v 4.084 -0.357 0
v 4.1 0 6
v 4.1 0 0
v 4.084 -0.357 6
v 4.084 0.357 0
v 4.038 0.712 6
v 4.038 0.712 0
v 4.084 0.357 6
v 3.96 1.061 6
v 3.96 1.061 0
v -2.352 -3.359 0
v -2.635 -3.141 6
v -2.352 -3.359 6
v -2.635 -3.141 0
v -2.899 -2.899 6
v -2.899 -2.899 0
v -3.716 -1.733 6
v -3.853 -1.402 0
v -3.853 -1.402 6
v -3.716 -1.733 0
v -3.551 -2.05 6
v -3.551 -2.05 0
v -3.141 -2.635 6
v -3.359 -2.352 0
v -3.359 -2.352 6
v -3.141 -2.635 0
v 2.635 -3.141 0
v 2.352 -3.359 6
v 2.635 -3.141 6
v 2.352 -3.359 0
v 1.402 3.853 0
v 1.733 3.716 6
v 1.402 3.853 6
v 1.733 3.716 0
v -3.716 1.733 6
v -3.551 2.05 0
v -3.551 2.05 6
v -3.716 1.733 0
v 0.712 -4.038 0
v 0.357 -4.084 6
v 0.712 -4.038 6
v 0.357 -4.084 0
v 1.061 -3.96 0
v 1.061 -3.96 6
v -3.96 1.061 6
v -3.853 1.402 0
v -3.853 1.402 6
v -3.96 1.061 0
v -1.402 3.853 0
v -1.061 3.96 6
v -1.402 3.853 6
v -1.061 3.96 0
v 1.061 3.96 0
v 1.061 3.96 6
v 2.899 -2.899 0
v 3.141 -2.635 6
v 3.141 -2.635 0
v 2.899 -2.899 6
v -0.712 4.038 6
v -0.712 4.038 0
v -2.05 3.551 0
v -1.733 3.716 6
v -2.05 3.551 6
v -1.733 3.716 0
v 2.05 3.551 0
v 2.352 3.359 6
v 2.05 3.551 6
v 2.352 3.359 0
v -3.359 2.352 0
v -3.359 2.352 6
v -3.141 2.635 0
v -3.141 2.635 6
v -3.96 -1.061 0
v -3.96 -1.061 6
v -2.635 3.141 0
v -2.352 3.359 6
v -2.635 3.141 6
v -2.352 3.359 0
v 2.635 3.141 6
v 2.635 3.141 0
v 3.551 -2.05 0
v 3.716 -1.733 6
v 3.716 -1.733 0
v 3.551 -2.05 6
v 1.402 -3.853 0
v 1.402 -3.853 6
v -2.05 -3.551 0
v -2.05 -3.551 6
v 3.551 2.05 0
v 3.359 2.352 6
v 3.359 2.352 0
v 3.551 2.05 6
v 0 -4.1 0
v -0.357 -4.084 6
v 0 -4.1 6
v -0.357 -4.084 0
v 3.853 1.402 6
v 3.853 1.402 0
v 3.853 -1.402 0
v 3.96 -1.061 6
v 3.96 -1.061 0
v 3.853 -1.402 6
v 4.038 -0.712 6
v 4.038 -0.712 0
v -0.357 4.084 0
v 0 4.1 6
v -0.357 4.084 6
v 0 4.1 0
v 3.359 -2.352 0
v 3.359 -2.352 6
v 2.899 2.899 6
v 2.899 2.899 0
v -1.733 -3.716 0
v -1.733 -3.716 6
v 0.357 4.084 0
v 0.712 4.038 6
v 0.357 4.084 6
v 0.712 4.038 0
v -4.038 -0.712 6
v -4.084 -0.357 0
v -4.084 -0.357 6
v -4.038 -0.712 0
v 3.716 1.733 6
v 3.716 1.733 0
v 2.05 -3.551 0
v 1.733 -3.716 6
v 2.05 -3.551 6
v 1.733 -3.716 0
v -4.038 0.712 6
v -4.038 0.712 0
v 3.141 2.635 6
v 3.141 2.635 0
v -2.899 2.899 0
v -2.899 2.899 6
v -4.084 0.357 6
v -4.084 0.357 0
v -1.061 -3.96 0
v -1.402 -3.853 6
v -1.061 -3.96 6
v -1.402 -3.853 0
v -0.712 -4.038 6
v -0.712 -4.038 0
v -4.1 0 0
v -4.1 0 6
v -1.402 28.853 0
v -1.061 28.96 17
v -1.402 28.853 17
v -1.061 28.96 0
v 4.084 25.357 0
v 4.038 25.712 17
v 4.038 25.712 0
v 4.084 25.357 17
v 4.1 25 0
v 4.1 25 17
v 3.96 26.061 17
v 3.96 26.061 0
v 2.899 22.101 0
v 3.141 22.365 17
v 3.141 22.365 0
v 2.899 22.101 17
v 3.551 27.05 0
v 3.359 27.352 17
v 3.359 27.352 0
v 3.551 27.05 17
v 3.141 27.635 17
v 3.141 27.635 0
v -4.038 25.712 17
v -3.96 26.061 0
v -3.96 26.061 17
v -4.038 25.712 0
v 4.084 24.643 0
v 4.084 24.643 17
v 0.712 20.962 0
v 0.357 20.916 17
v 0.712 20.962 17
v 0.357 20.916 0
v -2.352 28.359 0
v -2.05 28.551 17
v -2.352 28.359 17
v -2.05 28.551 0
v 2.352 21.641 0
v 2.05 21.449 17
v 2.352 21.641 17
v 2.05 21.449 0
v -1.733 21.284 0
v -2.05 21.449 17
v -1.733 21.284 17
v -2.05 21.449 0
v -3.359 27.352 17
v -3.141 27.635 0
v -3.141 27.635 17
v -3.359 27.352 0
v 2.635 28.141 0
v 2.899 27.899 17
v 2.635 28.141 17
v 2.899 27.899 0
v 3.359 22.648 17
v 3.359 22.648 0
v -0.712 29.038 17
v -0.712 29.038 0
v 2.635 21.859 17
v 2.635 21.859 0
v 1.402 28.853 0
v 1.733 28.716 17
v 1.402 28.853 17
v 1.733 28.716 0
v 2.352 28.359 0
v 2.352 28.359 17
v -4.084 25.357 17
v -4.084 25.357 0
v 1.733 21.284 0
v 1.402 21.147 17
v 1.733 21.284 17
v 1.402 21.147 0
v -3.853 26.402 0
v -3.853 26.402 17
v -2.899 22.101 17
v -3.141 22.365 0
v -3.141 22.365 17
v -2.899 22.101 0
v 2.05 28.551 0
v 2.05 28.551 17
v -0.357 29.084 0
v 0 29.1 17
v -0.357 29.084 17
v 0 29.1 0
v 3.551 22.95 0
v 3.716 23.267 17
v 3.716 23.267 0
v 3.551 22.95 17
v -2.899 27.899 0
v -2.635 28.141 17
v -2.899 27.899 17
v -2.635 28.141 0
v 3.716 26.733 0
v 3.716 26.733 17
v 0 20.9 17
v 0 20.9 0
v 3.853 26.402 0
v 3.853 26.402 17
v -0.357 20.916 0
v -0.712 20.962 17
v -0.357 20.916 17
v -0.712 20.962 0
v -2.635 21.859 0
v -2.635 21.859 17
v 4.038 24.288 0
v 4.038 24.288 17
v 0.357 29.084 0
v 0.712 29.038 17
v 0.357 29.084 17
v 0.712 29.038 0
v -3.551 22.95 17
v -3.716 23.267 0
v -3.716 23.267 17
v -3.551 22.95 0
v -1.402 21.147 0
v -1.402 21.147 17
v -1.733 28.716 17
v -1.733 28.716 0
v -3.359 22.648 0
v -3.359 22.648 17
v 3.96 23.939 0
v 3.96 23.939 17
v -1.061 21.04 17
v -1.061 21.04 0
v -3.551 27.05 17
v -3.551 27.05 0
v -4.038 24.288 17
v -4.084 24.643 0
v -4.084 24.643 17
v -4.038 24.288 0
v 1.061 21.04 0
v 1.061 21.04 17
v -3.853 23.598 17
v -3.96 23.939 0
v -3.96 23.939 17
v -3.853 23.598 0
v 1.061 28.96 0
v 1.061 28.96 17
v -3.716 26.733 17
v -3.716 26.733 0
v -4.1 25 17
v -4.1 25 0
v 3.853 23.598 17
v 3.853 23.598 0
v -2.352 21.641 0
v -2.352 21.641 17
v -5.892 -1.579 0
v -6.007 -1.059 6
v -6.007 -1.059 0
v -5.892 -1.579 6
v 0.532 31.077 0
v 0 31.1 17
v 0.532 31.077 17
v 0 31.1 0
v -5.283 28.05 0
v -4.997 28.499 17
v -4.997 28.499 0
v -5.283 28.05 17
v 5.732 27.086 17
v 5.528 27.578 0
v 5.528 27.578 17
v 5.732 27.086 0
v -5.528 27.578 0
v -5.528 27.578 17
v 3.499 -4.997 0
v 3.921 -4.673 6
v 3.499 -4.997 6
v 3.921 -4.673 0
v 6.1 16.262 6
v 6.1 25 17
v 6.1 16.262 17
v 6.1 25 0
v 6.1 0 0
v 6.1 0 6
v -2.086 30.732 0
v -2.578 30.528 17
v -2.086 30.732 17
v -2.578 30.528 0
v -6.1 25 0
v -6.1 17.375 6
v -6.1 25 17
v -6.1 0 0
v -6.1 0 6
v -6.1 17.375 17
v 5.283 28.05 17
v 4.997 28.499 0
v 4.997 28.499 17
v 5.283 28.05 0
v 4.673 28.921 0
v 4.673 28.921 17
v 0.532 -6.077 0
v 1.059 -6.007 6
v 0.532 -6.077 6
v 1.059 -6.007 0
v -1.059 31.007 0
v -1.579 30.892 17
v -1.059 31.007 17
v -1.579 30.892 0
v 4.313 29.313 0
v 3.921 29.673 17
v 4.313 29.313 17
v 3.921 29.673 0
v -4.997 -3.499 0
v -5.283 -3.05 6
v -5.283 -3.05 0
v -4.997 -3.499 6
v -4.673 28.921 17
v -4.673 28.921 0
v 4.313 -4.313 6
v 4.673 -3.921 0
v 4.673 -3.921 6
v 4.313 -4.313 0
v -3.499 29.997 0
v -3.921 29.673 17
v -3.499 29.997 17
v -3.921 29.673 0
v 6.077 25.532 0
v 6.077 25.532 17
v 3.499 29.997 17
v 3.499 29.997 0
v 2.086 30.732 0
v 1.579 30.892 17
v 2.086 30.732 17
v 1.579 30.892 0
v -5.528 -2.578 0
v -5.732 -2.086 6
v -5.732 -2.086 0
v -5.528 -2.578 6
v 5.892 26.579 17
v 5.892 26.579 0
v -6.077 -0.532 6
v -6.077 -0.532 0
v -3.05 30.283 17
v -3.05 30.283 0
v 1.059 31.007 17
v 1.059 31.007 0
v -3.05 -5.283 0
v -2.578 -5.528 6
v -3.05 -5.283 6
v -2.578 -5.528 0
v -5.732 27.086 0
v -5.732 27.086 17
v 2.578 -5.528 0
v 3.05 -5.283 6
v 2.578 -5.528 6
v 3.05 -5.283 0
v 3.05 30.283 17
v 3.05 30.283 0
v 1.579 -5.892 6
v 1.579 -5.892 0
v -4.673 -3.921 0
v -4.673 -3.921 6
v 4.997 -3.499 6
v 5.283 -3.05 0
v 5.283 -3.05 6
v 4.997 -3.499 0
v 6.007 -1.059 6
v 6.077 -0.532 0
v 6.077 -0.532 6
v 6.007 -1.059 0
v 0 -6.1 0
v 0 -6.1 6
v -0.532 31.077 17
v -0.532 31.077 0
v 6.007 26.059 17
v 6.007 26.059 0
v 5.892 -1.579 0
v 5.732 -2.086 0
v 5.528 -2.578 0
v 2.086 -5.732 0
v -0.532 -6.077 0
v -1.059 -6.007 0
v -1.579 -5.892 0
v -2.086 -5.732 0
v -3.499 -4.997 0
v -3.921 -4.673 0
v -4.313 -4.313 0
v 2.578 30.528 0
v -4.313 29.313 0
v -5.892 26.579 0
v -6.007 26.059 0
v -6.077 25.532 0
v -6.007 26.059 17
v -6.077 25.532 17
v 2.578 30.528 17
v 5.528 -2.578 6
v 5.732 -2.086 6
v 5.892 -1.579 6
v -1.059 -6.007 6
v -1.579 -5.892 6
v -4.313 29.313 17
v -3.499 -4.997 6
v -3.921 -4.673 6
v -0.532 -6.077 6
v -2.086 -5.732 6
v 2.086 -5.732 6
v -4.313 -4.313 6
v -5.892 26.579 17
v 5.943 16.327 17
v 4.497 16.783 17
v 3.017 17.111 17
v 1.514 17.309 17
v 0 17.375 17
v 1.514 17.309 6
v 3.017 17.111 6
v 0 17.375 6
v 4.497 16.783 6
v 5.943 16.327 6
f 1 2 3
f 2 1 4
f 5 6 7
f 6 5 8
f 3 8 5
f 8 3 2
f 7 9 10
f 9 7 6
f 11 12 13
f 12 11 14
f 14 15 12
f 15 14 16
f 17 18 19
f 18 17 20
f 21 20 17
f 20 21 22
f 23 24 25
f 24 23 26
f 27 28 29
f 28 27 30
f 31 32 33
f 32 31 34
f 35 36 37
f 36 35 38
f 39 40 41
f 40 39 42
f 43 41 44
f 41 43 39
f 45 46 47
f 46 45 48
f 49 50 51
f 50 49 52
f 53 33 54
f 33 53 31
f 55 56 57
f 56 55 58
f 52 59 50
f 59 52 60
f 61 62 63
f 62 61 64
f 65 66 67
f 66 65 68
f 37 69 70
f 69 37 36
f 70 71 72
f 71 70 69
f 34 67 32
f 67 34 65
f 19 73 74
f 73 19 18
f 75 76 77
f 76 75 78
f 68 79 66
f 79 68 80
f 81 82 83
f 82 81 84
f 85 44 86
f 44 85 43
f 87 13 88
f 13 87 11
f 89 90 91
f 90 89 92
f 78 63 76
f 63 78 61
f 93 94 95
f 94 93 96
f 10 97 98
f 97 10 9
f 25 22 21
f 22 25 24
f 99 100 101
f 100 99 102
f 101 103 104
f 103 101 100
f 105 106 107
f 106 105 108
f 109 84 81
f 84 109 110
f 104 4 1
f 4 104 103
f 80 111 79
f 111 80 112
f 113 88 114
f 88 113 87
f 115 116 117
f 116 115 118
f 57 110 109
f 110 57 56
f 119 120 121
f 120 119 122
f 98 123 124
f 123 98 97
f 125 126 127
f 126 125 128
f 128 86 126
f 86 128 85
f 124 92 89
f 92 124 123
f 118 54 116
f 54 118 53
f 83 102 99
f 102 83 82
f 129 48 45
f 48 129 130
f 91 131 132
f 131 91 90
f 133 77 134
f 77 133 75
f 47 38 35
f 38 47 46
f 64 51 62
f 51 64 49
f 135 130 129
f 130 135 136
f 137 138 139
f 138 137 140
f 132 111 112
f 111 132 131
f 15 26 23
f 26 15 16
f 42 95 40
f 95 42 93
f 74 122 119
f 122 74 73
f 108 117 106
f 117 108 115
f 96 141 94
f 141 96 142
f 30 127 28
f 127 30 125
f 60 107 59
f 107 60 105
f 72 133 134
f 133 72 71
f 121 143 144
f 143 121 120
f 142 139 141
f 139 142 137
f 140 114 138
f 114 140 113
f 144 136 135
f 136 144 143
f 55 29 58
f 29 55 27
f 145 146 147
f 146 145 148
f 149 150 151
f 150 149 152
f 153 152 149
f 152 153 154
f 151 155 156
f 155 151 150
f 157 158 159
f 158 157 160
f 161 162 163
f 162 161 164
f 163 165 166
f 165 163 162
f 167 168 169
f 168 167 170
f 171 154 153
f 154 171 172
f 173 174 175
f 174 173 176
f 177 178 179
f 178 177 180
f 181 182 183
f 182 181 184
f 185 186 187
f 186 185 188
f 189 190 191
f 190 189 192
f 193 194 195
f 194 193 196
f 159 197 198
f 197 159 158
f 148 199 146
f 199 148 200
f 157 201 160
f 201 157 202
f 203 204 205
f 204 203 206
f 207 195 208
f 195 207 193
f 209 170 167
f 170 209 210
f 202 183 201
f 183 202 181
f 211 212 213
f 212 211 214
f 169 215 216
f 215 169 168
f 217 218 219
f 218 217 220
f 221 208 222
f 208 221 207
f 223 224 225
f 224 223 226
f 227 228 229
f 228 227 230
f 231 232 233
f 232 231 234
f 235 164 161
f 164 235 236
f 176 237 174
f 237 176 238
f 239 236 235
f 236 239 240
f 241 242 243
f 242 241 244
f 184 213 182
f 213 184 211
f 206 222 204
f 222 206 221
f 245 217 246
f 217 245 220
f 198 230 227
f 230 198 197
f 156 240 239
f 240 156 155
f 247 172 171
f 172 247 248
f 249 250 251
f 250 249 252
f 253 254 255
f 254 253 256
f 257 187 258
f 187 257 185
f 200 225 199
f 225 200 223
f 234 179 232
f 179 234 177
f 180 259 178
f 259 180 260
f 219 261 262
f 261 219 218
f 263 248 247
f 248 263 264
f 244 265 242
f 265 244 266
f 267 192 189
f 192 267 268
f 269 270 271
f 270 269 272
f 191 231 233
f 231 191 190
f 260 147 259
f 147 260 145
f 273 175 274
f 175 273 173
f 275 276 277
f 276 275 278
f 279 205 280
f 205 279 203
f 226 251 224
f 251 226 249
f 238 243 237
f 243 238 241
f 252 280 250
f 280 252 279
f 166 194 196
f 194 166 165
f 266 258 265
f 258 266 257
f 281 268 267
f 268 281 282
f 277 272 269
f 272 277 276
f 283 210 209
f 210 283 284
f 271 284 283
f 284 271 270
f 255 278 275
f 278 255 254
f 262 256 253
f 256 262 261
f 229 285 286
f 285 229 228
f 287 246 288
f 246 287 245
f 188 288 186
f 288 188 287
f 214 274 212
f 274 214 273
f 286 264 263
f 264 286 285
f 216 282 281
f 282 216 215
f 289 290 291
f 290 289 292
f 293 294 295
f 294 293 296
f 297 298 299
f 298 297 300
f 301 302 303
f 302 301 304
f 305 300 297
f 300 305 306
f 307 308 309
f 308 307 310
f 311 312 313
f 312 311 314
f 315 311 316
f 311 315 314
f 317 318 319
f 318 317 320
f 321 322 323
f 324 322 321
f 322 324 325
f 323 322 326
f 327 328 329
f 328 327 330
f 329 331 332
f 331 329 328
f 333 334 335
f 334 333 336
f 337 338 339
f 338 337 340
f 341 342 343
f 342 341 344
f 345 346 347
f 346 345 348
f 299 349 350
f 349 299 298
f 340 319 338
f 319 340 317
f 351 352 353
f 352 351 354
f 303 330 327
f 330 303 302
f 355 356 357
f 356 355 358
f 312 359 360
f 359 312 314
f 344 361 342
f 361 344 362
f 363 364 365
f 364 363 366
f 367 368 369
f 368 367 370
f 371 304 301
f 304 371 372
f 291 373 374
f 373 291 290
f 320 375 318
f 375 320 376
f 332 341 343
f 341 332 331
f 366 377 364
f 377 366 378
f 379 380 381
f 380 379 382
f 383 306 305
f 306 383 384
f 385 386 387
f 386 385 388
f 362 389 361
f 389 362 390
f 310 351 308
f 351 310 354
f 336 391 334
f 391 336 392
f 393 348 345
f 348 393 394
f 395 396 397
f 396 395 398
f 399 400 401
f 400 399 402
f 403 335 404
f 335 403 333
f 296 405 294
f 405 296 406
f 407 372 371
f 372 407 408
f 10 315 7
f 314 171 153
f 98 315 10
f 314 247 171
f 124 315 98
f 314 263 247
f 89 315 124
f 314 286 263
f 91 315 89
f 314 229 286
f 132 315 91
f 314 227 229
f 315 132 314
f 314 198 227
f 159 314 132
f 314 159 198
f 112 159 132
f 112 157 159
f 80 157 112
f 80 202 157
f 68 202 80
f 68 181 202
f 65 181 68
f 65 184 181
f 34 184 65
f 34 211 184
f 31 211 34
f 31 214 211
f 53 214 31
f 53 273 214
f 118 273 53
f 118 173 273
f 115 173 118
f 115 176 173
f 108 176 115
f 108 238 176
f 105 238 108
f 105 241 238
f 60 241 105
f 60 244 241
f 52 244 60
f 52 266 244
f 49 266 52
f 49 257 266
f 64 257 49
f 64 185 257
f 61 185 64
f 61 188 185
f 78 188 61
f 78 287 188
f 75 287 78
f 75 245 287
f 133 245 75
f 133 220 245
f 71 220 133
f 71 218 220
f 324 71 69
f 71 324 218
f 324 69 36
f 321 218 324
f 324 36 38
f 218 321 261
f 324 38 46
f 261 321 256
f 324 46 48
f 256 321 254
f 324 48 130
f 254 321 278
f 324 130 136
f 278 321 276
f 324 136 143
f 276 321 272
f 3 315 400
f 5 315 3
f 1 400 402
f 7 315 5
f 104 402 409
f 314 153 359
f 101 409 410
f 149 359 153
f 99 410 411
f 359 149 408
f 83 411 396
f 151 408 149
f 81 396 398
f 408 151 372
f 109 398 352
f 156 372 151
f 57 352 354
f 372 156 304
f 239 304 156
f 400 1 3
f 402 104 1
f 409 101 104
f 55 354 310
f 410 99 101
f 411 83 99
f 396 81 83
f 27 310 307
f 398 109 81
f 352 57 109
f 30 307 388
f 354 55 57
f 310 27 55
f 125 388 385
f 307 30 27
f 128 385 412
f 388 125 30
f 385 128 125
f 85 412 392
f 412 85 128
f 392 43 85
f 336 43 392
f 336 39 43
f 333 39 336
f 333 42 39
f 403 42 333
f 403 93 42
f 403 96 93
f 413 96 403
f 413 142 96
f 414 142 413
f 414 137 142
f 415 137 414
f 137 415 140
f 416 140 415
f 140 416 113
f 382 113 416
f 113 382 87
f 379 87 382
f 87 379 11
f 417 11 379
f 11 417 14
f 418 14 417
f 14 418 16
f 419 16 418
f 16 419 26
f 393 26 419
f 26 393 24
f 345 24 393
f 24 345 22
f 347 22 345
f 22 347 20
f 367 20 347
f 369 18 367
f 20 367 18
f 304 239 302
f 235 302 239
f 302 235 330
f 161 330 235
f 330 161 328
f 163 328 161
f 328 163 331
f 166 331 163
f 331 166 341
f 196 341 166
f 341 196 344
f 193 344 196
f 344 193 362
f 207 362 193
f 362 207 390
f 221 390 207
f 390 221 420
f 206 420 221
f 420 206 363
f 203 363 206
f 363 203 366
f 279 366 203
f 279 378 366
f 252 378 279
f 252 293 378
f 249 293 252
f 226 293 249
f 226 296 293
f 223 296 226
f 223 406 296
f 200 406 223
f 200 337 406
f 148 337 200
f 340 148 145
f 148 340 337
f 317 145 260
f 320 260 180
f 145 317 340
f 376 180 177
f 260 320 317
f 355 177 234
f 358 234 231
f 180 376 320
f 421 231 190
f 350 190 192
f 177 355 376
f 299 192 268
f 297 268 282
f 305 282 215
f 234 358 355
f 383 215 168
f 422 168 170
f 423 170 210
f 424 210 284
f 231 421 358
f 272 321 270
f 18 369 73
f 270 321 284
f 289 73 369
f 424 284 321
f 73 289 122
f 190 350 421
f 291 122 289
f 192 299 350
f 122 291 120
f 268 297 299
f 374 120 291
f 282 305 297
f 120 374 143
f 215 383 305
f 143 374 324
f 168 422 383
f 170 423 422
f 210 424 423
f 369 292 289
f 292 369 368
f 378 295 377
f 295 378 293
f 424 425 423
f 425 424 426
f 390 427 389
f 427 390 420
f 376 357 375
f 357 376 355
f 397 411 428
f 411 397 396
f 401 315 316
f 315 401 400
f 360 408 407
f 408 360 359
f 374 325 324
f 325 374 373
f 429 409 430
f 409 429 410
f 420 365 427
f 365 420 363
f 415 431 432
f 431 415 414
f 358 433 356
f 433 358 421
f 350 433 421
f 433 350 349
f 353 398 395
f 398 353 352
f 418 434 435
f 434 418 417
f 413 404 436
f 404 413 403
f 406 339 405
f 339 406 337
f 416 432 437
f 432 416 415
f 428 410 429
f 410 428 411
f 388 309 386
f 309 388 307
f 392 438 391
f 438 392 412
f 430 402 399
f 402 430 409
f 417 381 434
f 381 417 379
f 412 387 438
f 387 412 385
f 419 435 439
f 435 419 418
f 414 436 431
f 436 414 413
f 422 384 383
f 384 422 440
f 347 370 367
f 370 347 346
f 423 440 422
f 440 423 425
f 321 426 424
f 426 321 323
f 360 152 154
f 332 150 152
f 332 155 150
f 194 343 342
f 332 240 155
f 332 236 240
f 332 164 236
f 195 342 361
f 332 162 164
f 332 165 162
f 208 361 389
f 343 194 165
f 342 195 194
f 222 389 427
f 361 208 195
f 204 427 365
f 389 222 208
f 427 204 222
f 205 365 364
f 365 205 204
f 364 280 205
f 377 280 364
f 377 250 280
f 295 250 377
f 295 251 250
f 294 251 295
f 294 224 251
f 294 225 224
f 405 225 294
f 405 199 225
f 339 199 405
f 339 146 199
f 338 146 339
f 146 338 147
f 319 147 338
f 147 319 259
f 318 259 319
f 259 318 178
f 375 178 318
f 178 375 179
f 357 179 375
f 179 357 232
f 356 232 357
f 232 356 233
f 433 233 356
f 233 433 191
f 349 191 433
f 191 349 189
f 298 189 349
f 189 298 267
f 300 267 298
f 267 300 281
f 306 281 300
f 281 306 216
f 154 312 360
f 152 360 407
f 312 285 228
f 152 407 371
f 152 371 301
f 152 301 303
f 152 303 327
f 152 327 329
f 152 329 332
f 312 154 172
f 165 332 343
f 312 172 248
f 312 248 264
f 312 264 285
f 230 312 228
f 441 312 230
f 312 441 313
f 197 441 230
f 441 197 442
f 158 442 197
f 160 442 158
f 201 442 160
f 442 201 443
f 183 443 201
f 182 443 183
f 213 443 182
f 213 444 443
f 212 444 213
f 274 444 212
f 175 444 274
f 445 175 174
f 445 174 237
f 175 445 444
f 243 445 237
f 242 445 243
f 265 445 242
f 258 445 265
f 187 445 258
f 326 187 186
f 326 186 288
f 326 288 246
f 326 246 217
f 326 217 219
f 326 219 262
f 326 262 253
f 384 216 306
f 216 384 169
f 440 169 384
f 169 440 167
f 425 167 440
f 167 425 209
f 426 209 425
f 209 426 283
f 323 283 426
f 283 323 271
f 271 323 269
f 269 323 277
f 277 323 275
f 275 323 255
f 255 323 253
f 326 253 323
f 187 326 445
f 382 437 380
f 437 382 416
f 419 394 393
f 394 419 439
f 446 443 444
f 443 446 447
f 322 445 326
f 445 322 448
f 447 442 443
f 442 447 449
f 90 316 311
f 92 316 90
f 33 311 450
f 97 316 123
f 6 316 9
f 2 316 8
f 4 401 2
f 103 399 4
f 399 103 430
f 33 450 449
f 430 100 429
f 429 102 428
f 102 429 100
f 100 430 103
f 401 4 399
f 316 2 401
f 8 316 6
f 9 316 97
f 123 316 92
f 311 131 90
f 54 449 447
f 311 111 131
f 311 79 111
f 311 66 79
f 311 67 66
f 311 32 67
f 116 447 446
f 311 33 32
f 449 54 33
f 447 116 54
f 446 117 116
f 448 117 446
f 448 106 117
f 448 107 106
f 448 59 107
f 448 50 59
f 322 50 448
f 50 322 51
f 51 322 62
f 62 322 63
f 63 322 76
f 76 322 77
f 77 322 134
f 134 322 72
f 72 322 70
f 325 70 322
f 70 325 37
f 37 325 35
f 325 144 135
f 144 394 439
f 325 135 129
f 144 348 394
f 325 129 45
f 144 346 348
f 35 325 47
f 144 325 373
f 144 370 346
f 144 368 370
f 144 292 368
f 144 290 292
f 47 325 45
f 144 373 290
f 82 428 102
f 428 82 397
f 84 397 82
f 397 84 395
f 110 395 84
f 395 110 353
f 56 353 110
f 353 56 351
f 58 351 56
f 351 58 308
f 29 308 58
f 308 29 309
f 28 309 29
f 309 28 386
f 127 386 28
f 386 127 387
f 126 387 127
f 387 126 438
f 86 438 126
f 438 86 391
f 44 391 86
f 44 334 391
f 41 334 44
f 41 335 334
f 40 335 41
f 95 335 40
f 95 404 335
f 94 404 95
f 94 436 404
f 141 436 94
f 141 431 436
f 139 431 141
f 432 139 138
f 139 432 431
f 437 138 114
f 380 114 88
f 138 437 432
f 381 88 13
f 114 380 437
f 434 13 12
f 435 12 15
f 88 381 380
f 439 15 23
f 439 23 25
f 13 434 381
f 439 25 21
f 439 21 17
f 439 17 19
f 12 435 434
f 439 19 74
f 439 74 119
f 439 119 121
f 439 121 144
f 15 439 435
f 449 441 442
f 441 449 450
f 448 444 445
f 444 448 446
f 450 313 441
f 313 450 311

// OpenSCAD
/*
 Towers to support Volor bearings.
 
 Basic stack:
 
 
 
 20mm 
 
 1" tubing
 
 
*/
$fs=0.1; $fa=5;

inch=25.4; // file units are mm

basicZ = 20; // Z main U tube up to bottom of towers
stackOC = 11; // Z distance from bearing to bearing, on center

OD = 22; // diameter of most towers
ID = 8.2; // diameter of hole through towers
dualOD=ID+4; // diameter of dual towers
dualY=25; // Y distance between dual towers
dualZ=basicZ - 14; // starts at smaller stub of frame

module basic(height=basicZ)
{
    difference() {
        cylinder(d=OD,h=height);
        cylinder(d=ID,h=3*height,center=true);
    }
}


module dual() 
{
    z=dualZ+stackOC;
    difference() {
        hull() {
            for (y=[0,dualY])
                translate([0,y,0])
                    cylinder(d=dualOD,h=z);
        }
        
        // cut in axle holes
        for (y=[0,dualY])
            translate([0,y,0])
                cylinder(d=ID,h=3*z,center=true);
         
         // Make space for lower axle and belt
         axlespace = 1.25*inch+3;
         hull() {
            for (x=[0,-dualY]) //<- space for belt to zoom off
                 translate([x,0,dualZ])
                    cylinder(d=axlespace,h=z);
         }
    }
}



part = 2;

if (part==0) basic(); // need 3 basic towers
if (part==1) basic(basicZ + stackOC); // high idler on bottom left
if (part==2) dual(); // dual towers on X carriage
